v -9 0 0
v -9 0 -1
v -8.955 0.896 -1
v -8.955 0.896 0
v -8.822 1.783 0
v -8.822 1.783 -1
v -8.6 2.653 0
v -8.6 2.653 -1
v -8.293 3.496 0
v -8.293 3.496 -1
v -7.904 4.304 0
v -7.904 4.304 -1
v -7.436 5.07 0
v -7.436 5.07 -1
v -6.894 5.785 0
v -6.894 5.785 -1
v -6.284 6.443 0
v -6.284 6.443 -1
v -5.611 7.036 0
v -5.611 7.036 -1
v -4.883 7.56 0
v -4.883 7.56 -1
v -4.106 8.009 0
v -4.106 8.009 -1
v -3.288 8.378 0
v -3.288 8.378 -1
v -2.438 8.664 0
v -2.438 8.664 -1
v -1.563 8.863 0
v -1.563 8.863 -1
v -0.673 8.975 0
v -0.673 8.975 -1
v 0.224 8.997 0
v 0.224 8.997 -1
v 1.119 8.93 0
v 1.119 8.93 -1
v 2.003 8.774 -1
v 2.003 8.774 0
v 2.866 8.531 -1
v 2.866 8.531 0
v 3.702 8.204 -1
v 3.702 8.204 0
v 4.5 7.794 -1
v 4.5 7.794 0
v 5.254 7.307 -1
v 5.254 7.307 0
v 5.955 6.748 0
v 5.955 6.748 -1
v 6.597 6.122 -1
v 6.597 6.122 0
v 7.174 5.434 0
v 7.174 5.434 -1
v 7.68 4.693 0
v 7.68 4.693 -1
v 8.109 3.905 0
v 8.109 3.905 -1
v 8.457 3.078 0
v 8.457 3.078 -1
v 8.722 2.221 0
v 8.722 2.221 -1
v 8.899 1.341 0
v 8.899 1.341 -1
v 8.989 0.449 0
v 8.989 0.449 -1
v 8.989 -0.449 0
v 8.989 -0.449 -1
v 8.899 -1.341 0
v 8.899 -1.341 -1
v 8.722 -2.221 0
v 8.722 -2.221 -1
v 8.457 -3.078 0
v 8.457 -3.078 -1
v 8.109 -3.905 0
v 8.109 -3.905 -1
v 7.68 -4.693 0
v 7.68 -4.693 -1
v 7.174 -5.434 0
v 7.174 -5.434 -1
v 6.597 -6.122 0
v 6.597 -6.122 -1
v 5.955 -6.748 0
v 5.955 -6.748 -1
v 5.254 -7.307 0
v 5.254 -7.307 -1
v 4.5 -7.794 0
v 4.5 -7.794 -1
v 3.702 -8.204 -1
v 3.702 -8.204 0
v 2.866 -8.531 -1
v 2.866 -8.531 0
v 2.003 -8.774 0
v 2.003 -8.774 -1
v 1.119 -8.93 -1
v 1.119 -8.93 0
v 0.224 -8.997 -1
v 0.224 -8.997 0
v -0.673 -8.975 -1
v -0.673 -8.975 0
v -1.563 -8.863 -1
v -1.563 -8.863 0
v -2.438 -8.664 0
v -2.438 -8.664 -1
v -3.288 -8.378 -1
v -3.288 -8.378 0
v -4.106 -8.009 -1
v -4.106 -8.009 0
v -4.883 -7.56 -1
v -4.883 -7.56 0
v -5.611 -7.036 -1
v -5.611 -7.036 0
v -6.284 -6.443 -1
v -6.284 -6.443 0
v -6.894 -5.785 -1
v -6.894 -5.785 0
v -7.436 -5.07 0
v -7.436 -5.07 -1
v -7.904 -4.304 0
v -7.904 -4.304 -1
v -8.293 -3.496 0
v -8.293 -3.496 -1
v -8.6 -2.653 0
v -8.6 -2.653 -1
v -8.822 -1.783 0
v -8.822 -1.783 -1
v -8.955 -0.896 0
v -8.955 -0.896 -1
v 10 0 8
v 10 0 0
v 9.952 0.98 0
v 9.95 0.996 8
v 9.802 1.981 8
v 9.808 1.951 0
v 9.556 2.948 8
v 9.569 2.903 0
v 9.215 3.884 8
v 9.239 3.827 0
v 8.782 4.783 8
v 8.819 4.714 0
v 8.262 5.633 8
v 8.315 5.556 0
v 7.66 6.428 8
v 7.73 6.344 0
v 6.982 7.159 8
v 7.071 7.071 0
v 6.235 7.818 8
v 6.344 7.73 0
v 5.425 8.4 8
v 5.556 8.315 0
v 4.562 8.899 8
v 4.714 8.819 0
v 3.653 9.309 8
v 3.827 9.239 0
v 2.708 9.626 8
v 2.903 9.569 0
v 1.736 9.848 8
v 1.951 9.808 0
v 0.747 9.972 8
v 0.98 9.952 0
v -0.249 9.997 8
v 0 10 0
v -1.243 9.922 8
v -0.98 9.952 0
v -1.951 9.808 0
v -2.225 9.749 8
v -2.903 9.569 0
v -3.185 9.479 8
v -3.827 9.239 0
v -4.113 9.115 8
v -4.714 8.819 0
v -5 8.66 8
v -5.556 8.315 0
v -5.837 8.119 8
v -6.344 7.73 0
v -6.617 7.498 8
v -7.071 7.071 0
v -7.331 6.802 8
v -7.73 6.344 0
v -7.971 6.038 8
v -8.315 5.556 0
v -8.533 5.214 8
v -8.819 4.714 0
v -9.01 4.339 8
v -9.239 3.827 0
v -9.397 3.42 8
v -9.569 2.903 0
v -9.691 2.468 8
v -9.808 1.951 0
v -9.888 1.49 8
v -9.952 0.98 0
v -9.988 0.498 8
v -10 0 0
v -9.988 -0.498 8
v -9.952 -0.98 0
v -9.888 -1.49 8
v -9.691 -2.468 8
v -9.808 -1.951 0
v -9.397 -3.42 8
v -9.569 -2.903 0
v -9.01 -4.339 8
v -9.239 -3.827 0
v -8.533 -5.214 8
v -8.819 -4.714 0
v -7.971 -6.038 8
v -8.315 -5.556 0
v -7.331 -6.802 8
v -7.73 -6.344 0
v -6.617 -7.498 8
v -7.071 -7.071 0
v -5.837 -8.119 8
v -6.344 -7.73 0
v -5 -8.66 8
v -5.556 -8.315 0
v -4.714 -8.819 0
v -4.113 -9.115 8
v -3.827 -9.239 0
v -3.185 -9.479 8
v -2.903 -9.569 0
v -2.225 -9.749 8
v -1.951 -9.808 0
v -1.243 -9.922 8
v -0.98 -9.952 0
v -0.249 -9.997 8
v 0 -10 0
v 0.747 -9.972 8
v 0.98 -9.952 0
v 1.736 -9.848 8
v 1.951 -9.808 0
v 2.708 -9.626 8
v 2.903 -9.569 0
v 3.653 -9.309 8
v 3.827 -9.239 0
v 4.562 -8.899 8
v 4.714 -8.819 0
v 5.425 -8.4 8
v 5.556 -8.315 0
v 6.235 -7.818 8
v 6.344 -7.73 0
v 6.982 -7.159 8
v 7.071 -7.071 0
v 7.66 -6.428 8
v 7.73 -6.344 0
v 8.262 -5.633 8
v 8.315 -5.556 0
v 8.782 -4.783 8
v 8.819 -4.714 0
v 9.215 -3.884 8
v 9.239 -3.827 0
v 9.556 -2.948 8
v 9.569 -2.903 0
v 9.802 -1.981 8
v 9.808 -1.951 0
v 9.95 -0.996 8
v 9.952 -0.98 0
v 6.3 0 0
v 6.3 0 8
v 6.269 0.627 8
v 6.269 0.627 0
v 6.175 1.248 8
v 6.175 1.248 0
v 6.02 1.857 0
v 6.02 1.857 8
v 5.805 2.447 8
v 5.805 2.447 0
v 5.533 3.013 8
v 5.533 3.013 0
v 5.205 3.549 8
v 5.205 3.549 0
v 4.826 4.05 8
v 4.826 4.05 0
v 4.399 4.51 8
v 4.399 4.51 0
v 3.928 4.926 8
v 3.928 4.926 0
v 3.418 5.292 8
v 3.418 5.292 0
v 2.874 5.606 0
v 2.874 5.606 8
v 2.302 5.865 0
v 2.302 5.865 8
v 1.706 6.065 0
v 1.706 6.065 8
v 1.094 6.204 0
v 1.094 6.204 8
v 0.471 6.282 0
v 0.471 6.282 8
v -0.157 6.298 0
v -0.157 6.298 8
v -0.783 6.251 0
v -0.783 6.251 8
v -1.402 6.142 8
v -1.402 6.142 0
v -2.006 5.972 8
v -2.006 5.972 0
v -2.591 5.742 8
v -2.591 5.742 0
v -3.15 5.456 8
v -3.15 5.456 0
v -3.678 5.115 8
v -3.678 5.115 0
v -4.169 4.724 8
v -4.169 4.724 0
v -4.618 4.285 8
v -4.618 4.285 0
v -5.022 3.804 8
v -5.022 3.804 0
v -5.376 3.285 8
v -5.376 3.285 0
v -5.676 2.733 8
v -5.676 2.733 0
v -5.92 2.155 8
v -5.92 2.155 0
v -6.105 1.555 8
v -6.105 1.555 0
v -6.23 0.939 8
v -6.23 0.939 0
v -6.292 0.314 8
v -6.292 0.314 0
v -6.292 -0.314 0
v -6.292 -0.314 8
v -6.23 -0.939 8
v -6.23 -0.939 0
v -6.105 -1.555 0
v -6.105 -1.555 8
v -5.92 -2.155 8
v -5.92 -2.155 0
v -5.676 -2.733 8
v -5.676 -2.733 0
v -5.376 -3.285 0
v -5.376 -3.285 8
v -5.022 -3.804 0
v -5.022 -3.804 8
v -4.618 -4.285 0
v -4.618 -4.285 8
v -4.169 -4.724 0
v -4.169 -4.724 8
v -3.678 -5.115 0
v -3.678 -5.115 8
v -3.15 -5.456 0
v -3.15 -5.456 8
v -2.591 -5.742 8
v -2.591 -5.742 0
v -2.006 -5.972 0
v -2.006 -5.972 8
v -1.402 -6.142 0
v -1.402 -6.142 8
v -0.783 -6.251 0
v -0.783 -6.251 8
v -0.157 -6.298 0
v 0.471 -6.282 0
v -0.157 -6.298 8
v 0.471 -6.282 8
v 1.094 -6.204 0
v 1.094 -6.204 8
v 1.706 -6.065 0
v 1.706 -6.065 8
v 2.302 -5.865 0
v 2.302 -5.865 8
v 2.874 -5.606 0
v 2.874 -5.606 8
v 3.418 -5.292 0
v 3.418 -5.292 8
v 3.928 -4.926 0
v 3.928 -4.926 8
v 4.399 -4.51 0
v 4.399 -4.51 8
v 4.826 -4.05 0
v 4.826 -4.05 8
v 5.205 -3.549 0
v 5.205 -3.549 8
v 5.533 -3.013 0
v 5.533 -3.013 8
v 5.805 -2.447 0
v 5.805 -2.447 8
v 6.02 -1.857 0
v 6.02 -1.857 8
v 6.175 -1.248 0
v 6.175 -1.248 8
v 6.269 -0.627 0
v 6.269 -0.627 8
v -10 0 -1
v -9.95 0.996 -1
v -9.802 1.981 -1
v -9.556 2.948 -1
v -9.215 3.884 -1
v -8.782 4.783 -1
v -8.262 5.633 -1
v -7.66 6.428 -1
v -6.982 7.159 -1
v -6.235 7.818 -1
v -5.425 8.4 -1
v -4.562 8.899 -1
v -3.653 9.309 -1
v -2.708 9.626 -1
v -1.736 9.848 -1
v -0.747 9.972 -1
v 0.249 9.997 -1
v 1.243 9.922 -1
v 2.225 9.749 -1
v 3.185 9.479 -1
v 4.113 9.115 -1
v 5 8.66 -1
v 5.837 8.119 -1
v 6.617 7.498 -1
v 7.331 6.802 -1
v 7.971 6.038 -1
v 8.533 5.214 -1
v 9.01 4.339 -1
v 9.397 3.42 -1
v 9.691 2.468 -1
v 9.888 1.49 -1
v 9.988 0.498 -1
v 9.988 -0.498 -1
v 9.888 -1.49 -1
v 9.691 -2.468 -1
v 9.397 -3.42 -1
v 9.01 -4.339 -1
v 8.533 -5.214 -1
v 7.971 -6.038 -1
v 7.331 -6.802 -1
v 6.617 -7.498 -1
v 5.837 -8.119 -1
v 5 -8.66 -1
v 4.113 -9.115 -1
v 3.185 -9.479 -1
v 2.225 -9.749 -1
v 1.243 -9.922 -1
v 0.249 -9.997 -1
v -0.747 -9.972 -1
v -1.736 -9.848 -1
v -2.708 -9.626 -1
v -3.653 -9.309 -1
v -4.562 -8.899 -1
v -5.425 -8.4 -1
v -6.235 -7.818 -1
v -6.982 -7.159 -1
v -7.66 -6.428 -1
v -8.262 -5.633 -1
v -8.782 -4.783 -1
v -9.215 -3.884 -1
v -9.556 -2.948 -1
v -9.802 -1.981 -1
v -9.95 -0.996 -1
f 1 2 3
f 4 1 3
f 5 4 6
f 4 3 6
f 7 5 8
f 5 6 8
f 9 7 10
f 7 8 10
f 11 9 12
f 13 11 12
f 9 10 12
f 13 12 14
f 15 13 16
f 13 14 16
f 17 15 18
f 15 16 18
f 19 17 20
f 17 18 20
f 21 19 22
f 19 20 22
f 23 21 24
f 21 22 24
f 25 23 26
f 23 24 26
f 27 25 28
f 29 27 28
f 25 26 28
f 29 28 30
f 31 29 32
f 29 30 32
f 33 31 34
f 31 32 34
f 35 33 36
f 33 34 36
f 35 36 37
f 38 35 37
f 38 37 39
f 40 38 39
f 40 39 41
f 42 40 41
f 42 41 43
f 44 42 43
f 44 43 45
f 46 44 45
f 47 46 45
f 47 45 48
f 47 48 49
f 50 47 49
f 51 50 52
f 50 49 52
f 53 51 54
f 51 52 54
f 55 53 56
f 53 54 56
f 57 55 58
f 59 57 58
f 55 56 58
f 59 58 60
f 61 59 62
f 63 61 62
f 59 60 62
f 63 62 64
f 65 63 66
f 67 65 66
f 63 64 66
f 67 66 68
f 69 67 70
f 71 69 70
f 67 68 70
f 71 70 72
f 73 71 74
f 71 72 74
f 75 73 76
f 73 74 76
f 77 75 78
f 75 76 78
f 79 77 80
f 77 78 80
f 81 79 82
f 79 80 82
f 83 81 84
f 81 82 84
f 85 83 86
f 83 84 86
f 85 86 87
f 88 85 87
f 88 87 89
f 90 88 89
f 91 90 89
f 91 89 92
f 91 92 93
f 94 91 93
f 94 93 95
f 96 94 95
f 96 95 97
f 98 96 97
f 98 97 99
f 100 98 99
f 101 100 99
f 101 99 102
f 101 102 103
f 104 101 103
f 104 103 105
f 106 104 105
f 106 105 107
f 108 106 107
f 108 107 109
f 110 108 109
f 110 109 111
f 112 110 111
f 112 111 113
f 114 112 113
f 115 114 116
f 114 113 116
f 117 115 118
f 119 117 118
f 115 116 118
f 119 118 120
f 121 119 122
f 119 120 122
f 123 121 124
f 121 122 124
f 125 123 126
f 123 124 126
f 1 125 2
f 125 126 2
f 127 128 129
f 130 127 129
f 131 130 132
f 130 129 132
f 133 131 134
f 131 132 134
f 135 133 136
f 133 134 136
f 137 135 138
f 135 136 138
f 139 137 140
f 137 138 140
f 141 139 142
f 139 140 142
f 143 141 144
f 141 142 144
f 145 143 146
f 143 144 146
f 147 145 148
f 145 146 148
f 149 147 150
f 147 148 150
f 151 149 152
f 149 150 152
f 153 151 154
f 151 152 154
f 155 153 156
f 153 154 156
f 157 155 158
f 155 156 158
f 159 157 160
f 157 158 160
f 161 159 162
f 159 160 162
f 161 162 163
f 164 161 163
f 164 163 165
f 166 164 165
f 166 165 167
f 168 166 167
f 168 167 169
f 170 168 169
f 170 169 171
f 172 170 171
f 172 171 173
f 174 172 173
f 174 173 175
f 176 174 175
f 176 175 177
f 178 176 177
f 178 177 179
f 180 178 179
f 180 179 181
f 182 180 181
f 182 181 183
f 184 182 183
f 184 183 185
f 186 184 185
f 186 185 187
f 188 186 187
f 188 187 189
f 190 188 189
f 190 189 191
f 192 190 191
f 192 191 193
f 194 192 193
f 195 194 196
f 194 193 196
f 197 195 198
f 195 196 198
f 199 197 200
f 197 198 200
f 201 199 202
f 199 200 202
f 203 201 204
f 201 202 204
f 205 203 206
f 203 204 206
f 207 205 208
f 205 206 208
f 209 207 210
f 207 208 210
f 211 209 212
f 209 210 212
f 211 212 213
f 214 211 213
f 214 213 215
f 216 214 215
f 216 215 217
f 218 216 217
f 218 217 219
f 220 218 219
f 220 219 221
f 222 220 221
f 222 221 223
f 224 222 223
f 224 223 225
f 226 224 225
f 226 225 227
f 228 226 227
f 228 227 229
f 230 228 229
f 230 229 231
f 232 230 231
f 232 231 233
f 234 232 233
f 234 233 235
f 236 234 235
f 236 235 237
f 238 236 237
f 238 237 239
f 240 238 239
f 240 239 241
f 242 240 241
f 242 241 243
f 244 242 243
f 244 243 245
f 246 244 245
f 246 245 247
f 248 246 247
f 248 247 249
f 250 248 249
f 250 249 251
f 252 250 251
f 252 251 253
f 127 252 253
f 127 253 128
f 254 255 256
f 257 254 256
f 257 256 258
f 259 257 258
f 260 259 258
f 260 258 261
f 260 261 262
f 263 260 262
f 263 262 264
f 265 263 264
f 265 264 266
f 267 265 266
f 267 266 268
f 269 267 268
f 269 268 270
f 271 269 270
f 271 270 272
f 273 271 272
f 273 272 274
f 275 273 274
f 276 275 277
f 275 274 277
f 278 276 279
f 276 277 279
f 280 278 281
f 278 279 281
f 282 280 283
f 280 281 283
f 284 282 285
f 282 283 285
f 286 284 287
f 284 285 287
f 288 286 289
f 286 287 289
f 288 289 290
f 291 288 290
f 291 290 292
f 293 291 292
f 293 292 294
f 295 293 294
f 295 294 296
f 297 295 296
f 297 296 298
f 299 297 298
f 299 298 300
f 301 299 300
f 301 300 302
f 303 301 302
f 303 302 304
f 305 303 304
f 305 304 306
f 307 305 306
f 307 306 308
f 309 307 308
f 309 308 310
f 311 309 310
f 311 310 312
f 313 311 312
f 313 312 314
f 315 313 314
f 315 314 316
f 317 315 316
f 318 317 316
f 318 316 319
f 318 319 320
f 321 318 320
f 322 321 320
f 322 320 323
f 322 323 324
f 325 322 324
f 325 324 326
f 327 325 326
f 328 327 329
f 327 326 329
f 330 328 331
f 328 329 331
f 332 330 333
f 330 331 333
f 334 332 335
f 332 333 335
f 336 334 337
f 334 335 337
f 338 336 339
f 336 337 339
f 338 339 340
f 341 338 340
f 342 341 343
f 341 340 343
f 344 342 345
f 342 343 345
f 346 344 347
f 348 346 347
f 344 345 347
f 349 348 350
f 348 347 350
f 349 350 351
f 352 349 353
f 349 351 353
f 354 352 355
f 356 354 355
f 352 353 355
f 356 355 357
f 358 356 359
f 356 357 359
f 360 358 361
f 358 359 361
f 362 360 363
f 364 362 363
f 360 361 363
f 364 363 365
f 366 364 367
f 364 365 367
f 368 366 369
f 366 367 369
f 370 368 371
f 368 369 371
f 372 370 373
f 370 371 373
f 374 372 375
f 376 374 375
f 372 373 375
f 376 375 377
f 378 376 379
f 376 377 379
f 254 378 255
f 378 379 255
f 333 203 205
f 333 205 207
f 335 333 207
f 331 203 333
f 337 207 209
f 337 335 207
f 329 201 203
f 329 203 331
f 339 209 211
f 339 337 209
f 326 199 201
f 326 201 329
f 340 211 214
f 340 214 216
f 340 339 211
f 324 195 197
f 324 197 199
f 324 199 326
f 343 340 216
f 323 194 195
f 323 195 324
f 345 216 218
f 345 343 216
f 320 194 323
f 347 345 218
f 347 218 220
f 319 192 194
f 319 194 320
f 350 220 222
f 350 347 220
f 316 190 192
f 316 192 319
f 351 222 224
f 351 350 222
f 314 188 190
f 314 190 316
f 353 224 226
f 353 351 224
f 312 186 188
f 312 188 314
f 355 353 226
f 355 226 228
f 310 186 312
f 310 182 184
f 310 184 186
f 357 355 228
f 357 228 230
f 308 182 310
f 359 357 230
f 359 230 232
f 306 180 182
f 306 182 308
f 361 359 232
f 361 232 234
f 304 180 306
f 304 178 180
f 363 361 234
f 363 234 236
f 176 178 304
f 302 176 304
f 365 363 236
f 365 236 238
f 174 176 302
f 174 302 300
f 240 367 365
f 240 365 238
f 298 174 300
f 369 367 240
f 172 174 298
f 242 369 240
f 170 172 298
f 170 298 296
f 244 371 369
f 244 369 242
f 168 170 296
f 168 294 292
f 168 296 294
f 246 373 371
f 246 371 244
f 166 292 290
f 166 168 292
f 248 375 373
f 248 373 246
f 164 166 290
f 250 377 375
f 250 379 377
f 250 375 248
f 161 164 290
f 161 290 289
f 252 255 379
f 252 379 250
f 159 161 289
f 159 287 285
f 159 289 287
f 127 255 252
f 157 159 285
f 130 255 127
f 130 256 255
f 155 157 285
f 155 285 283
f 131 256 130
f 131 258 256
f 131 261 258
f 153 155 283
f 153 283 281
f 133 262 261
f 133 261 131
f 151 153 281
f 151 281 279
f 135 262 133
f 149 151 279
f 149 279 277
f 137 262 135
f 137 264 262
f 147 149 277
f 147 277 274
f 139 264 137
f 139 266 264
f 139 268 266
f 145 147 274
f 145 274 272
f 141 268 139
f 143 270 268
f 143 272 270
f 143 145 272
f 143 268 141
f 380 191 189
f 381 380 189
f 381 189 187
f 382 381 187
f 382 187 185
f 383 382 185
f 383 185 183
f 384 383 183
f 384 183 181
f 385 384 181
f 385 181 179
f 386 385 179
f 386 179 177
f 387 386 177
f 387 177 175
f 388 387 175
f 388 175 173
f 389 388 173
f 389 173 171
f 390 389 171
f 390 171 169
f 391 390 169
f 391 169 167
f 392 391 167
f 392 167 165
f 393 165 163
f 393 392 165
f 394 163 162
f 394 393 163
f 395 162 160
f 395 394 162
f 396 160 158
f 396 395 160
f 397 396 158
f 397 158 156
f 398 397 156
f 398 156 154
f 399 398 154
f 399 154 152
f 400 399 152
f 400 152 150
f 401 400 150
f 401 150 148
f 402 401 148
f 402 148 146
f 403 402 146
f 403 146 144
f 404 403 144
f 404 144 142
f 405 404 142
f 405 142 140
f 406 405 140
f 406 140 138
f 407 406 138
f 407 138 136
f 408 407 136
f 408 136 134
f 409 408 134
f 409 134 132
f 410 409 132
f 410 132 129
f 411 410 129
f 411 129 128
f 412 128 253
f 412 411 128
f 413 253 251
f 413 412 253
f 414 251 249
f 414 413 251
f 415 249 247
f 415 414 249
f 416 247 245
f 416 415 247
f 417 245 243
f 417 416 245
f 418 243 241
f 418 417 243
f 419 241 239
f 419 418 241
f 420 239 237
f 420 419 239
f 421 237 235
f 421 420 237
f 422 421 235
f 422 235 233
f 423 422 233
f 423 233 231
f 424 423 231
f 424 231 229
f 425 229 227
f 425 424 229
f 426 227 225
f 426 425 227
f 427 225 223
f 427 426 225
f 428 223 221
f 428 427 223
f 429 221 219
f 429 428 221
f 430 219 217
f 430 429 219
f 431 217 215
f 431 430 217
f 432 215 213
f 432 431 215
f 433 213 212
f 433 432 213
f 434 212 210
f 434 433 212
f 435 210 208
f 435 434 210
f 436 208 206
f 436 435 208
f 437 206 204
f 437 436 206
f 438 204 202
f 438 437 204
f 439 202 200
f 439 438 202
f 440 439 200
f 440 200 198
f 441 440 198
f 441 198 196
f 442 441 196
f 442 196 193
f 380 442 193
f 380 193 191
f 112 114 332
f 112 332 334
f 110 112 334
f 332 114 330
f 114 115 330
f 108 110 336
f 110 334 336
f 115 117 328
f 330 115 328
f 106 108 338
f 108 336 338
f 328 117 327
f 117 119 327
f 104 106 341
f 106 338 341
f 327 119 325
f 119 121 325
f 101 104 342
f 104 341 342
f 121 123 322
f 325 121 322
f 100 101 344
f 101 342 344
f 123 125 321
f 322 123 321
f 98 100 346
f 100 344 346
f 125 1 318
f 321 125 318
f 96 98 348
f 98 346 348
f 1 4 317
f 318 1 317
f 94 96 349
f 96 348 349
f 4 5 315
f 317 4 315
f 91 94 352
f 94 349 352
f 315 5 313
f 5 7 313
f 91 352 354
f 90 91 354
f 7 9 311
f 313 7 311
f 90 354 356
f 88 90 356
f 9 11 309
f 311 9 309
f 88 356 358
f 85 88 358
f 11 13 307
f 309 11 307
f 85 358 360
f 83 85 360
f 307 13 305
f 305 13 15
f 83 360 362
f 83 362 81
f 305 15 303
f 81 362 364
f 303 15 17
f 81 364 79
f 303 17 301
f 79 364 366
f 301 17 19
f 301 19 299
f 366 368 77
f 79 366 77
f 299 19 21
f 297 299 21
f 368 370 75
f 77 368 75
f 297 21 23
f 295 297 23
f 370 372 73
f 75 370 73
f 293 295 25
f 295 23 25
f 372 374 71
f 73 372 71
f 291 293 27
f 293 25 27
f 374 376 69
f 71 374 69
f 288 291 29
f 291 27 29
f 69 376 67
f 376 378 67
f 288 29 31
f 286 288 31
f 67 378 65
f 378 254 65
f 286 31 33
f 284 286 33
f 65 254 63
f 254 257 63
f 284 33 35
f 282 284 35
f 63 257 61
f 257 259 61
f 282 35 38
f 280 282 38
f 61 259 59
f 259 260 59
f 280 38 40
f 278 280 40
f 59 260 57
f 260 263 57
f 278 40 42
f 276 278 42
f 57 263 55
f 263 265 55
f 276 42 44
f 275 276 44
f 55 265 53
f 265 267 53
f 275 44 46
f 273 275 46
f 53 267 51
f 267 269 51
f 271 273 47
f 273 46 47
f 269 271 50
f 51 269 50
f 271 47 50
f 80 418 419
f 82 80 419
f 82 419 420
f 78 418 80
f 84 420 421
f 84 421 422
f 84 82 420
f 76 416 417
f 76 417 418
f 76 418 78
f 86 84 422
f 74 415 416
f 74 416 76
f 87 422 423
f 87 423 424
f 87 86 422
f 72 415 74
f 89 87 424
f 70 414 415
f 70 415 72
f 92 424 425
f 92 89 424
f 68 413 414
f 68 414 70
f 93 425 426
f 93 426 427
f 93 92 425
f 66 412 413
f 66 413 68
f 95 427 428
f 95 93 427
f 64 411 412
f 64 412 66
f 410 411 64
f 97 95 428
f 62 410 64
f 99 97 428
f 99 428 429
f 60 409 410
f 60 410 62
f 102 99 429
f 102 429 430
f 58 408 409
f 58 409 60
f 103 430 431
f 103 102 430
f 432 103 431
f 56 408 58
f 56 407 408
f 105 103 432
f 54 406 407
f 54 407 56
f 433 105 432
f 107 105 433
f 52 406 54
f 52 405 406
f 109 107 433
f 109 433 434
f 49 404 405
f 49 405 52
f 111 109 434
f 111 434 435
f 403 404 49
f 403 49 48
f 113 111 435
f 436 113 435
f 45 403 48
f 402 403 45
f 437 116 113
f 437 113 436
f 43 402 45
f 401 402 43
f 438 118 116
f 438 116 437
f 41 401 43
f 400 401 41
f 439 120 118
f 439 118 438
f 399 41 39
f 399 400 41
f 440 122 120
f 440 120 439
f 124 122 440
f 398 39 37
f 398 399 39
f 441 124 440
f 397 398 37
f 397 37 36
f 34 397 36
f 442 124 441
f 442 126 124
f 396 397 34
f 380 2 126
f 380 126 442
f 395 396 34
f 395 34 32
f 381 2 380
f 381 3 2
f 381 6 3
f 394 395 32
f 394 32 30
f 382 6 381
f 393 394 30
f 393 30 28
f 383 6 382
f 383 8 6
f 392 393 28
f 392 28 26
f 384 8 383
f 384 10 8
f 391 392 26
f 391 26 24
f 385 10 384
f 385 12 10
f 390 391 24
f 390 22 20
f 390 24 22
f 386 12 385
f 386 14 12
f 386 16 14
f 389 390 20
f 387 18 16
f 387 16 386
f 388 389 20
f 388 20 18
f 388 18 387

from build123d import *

# Parameters (mm, degrees)
SKETCH1_R          = 10
EXTRUDE1_DEPTH     = 8
EXTRUDE2_START     = 1
SKETCH3_R          = 10
SKETCH3_R_2        = 9
EXTRUDE2_DEPTH     = 1
SKETCH2_R          = 6.3
CUT_EXTRUDE1_DEPTH = 17.763054614


with BuildPart() as part:
    # Sketch1 → Extrude1 (new body)
    with BuildSketch(Plane.XY):
        Circle(SKETCH1_R)
    extrude(amount=EXTRUDE1_DEPTH)

    # Sketch3 → Extrude2 (add)
    with BuildSketch(Plane(origin=(0, 0, 0), x_dir=(-1, 0, 0), z_dir=(0, 0, -1)).offset(EXTRUDE2_START)):
        Circle(SKETCH3_R)
        Circle(SKETCH3_R_2, mode=Mode.SUBTRACT)
    extrude(amount=-EXTRUDE2_DEPTH)

    # Sketch2 → Cut-Extrude1 (cut, through all)
    with BuildSketch(Plane.XY.offset(8)):
        Circle(SKETCH2_R)
    extrude(amount=-CUT_EXTRUDE1_DEPTH, mode=Mode.SUBTRACT)


solid = part.part
